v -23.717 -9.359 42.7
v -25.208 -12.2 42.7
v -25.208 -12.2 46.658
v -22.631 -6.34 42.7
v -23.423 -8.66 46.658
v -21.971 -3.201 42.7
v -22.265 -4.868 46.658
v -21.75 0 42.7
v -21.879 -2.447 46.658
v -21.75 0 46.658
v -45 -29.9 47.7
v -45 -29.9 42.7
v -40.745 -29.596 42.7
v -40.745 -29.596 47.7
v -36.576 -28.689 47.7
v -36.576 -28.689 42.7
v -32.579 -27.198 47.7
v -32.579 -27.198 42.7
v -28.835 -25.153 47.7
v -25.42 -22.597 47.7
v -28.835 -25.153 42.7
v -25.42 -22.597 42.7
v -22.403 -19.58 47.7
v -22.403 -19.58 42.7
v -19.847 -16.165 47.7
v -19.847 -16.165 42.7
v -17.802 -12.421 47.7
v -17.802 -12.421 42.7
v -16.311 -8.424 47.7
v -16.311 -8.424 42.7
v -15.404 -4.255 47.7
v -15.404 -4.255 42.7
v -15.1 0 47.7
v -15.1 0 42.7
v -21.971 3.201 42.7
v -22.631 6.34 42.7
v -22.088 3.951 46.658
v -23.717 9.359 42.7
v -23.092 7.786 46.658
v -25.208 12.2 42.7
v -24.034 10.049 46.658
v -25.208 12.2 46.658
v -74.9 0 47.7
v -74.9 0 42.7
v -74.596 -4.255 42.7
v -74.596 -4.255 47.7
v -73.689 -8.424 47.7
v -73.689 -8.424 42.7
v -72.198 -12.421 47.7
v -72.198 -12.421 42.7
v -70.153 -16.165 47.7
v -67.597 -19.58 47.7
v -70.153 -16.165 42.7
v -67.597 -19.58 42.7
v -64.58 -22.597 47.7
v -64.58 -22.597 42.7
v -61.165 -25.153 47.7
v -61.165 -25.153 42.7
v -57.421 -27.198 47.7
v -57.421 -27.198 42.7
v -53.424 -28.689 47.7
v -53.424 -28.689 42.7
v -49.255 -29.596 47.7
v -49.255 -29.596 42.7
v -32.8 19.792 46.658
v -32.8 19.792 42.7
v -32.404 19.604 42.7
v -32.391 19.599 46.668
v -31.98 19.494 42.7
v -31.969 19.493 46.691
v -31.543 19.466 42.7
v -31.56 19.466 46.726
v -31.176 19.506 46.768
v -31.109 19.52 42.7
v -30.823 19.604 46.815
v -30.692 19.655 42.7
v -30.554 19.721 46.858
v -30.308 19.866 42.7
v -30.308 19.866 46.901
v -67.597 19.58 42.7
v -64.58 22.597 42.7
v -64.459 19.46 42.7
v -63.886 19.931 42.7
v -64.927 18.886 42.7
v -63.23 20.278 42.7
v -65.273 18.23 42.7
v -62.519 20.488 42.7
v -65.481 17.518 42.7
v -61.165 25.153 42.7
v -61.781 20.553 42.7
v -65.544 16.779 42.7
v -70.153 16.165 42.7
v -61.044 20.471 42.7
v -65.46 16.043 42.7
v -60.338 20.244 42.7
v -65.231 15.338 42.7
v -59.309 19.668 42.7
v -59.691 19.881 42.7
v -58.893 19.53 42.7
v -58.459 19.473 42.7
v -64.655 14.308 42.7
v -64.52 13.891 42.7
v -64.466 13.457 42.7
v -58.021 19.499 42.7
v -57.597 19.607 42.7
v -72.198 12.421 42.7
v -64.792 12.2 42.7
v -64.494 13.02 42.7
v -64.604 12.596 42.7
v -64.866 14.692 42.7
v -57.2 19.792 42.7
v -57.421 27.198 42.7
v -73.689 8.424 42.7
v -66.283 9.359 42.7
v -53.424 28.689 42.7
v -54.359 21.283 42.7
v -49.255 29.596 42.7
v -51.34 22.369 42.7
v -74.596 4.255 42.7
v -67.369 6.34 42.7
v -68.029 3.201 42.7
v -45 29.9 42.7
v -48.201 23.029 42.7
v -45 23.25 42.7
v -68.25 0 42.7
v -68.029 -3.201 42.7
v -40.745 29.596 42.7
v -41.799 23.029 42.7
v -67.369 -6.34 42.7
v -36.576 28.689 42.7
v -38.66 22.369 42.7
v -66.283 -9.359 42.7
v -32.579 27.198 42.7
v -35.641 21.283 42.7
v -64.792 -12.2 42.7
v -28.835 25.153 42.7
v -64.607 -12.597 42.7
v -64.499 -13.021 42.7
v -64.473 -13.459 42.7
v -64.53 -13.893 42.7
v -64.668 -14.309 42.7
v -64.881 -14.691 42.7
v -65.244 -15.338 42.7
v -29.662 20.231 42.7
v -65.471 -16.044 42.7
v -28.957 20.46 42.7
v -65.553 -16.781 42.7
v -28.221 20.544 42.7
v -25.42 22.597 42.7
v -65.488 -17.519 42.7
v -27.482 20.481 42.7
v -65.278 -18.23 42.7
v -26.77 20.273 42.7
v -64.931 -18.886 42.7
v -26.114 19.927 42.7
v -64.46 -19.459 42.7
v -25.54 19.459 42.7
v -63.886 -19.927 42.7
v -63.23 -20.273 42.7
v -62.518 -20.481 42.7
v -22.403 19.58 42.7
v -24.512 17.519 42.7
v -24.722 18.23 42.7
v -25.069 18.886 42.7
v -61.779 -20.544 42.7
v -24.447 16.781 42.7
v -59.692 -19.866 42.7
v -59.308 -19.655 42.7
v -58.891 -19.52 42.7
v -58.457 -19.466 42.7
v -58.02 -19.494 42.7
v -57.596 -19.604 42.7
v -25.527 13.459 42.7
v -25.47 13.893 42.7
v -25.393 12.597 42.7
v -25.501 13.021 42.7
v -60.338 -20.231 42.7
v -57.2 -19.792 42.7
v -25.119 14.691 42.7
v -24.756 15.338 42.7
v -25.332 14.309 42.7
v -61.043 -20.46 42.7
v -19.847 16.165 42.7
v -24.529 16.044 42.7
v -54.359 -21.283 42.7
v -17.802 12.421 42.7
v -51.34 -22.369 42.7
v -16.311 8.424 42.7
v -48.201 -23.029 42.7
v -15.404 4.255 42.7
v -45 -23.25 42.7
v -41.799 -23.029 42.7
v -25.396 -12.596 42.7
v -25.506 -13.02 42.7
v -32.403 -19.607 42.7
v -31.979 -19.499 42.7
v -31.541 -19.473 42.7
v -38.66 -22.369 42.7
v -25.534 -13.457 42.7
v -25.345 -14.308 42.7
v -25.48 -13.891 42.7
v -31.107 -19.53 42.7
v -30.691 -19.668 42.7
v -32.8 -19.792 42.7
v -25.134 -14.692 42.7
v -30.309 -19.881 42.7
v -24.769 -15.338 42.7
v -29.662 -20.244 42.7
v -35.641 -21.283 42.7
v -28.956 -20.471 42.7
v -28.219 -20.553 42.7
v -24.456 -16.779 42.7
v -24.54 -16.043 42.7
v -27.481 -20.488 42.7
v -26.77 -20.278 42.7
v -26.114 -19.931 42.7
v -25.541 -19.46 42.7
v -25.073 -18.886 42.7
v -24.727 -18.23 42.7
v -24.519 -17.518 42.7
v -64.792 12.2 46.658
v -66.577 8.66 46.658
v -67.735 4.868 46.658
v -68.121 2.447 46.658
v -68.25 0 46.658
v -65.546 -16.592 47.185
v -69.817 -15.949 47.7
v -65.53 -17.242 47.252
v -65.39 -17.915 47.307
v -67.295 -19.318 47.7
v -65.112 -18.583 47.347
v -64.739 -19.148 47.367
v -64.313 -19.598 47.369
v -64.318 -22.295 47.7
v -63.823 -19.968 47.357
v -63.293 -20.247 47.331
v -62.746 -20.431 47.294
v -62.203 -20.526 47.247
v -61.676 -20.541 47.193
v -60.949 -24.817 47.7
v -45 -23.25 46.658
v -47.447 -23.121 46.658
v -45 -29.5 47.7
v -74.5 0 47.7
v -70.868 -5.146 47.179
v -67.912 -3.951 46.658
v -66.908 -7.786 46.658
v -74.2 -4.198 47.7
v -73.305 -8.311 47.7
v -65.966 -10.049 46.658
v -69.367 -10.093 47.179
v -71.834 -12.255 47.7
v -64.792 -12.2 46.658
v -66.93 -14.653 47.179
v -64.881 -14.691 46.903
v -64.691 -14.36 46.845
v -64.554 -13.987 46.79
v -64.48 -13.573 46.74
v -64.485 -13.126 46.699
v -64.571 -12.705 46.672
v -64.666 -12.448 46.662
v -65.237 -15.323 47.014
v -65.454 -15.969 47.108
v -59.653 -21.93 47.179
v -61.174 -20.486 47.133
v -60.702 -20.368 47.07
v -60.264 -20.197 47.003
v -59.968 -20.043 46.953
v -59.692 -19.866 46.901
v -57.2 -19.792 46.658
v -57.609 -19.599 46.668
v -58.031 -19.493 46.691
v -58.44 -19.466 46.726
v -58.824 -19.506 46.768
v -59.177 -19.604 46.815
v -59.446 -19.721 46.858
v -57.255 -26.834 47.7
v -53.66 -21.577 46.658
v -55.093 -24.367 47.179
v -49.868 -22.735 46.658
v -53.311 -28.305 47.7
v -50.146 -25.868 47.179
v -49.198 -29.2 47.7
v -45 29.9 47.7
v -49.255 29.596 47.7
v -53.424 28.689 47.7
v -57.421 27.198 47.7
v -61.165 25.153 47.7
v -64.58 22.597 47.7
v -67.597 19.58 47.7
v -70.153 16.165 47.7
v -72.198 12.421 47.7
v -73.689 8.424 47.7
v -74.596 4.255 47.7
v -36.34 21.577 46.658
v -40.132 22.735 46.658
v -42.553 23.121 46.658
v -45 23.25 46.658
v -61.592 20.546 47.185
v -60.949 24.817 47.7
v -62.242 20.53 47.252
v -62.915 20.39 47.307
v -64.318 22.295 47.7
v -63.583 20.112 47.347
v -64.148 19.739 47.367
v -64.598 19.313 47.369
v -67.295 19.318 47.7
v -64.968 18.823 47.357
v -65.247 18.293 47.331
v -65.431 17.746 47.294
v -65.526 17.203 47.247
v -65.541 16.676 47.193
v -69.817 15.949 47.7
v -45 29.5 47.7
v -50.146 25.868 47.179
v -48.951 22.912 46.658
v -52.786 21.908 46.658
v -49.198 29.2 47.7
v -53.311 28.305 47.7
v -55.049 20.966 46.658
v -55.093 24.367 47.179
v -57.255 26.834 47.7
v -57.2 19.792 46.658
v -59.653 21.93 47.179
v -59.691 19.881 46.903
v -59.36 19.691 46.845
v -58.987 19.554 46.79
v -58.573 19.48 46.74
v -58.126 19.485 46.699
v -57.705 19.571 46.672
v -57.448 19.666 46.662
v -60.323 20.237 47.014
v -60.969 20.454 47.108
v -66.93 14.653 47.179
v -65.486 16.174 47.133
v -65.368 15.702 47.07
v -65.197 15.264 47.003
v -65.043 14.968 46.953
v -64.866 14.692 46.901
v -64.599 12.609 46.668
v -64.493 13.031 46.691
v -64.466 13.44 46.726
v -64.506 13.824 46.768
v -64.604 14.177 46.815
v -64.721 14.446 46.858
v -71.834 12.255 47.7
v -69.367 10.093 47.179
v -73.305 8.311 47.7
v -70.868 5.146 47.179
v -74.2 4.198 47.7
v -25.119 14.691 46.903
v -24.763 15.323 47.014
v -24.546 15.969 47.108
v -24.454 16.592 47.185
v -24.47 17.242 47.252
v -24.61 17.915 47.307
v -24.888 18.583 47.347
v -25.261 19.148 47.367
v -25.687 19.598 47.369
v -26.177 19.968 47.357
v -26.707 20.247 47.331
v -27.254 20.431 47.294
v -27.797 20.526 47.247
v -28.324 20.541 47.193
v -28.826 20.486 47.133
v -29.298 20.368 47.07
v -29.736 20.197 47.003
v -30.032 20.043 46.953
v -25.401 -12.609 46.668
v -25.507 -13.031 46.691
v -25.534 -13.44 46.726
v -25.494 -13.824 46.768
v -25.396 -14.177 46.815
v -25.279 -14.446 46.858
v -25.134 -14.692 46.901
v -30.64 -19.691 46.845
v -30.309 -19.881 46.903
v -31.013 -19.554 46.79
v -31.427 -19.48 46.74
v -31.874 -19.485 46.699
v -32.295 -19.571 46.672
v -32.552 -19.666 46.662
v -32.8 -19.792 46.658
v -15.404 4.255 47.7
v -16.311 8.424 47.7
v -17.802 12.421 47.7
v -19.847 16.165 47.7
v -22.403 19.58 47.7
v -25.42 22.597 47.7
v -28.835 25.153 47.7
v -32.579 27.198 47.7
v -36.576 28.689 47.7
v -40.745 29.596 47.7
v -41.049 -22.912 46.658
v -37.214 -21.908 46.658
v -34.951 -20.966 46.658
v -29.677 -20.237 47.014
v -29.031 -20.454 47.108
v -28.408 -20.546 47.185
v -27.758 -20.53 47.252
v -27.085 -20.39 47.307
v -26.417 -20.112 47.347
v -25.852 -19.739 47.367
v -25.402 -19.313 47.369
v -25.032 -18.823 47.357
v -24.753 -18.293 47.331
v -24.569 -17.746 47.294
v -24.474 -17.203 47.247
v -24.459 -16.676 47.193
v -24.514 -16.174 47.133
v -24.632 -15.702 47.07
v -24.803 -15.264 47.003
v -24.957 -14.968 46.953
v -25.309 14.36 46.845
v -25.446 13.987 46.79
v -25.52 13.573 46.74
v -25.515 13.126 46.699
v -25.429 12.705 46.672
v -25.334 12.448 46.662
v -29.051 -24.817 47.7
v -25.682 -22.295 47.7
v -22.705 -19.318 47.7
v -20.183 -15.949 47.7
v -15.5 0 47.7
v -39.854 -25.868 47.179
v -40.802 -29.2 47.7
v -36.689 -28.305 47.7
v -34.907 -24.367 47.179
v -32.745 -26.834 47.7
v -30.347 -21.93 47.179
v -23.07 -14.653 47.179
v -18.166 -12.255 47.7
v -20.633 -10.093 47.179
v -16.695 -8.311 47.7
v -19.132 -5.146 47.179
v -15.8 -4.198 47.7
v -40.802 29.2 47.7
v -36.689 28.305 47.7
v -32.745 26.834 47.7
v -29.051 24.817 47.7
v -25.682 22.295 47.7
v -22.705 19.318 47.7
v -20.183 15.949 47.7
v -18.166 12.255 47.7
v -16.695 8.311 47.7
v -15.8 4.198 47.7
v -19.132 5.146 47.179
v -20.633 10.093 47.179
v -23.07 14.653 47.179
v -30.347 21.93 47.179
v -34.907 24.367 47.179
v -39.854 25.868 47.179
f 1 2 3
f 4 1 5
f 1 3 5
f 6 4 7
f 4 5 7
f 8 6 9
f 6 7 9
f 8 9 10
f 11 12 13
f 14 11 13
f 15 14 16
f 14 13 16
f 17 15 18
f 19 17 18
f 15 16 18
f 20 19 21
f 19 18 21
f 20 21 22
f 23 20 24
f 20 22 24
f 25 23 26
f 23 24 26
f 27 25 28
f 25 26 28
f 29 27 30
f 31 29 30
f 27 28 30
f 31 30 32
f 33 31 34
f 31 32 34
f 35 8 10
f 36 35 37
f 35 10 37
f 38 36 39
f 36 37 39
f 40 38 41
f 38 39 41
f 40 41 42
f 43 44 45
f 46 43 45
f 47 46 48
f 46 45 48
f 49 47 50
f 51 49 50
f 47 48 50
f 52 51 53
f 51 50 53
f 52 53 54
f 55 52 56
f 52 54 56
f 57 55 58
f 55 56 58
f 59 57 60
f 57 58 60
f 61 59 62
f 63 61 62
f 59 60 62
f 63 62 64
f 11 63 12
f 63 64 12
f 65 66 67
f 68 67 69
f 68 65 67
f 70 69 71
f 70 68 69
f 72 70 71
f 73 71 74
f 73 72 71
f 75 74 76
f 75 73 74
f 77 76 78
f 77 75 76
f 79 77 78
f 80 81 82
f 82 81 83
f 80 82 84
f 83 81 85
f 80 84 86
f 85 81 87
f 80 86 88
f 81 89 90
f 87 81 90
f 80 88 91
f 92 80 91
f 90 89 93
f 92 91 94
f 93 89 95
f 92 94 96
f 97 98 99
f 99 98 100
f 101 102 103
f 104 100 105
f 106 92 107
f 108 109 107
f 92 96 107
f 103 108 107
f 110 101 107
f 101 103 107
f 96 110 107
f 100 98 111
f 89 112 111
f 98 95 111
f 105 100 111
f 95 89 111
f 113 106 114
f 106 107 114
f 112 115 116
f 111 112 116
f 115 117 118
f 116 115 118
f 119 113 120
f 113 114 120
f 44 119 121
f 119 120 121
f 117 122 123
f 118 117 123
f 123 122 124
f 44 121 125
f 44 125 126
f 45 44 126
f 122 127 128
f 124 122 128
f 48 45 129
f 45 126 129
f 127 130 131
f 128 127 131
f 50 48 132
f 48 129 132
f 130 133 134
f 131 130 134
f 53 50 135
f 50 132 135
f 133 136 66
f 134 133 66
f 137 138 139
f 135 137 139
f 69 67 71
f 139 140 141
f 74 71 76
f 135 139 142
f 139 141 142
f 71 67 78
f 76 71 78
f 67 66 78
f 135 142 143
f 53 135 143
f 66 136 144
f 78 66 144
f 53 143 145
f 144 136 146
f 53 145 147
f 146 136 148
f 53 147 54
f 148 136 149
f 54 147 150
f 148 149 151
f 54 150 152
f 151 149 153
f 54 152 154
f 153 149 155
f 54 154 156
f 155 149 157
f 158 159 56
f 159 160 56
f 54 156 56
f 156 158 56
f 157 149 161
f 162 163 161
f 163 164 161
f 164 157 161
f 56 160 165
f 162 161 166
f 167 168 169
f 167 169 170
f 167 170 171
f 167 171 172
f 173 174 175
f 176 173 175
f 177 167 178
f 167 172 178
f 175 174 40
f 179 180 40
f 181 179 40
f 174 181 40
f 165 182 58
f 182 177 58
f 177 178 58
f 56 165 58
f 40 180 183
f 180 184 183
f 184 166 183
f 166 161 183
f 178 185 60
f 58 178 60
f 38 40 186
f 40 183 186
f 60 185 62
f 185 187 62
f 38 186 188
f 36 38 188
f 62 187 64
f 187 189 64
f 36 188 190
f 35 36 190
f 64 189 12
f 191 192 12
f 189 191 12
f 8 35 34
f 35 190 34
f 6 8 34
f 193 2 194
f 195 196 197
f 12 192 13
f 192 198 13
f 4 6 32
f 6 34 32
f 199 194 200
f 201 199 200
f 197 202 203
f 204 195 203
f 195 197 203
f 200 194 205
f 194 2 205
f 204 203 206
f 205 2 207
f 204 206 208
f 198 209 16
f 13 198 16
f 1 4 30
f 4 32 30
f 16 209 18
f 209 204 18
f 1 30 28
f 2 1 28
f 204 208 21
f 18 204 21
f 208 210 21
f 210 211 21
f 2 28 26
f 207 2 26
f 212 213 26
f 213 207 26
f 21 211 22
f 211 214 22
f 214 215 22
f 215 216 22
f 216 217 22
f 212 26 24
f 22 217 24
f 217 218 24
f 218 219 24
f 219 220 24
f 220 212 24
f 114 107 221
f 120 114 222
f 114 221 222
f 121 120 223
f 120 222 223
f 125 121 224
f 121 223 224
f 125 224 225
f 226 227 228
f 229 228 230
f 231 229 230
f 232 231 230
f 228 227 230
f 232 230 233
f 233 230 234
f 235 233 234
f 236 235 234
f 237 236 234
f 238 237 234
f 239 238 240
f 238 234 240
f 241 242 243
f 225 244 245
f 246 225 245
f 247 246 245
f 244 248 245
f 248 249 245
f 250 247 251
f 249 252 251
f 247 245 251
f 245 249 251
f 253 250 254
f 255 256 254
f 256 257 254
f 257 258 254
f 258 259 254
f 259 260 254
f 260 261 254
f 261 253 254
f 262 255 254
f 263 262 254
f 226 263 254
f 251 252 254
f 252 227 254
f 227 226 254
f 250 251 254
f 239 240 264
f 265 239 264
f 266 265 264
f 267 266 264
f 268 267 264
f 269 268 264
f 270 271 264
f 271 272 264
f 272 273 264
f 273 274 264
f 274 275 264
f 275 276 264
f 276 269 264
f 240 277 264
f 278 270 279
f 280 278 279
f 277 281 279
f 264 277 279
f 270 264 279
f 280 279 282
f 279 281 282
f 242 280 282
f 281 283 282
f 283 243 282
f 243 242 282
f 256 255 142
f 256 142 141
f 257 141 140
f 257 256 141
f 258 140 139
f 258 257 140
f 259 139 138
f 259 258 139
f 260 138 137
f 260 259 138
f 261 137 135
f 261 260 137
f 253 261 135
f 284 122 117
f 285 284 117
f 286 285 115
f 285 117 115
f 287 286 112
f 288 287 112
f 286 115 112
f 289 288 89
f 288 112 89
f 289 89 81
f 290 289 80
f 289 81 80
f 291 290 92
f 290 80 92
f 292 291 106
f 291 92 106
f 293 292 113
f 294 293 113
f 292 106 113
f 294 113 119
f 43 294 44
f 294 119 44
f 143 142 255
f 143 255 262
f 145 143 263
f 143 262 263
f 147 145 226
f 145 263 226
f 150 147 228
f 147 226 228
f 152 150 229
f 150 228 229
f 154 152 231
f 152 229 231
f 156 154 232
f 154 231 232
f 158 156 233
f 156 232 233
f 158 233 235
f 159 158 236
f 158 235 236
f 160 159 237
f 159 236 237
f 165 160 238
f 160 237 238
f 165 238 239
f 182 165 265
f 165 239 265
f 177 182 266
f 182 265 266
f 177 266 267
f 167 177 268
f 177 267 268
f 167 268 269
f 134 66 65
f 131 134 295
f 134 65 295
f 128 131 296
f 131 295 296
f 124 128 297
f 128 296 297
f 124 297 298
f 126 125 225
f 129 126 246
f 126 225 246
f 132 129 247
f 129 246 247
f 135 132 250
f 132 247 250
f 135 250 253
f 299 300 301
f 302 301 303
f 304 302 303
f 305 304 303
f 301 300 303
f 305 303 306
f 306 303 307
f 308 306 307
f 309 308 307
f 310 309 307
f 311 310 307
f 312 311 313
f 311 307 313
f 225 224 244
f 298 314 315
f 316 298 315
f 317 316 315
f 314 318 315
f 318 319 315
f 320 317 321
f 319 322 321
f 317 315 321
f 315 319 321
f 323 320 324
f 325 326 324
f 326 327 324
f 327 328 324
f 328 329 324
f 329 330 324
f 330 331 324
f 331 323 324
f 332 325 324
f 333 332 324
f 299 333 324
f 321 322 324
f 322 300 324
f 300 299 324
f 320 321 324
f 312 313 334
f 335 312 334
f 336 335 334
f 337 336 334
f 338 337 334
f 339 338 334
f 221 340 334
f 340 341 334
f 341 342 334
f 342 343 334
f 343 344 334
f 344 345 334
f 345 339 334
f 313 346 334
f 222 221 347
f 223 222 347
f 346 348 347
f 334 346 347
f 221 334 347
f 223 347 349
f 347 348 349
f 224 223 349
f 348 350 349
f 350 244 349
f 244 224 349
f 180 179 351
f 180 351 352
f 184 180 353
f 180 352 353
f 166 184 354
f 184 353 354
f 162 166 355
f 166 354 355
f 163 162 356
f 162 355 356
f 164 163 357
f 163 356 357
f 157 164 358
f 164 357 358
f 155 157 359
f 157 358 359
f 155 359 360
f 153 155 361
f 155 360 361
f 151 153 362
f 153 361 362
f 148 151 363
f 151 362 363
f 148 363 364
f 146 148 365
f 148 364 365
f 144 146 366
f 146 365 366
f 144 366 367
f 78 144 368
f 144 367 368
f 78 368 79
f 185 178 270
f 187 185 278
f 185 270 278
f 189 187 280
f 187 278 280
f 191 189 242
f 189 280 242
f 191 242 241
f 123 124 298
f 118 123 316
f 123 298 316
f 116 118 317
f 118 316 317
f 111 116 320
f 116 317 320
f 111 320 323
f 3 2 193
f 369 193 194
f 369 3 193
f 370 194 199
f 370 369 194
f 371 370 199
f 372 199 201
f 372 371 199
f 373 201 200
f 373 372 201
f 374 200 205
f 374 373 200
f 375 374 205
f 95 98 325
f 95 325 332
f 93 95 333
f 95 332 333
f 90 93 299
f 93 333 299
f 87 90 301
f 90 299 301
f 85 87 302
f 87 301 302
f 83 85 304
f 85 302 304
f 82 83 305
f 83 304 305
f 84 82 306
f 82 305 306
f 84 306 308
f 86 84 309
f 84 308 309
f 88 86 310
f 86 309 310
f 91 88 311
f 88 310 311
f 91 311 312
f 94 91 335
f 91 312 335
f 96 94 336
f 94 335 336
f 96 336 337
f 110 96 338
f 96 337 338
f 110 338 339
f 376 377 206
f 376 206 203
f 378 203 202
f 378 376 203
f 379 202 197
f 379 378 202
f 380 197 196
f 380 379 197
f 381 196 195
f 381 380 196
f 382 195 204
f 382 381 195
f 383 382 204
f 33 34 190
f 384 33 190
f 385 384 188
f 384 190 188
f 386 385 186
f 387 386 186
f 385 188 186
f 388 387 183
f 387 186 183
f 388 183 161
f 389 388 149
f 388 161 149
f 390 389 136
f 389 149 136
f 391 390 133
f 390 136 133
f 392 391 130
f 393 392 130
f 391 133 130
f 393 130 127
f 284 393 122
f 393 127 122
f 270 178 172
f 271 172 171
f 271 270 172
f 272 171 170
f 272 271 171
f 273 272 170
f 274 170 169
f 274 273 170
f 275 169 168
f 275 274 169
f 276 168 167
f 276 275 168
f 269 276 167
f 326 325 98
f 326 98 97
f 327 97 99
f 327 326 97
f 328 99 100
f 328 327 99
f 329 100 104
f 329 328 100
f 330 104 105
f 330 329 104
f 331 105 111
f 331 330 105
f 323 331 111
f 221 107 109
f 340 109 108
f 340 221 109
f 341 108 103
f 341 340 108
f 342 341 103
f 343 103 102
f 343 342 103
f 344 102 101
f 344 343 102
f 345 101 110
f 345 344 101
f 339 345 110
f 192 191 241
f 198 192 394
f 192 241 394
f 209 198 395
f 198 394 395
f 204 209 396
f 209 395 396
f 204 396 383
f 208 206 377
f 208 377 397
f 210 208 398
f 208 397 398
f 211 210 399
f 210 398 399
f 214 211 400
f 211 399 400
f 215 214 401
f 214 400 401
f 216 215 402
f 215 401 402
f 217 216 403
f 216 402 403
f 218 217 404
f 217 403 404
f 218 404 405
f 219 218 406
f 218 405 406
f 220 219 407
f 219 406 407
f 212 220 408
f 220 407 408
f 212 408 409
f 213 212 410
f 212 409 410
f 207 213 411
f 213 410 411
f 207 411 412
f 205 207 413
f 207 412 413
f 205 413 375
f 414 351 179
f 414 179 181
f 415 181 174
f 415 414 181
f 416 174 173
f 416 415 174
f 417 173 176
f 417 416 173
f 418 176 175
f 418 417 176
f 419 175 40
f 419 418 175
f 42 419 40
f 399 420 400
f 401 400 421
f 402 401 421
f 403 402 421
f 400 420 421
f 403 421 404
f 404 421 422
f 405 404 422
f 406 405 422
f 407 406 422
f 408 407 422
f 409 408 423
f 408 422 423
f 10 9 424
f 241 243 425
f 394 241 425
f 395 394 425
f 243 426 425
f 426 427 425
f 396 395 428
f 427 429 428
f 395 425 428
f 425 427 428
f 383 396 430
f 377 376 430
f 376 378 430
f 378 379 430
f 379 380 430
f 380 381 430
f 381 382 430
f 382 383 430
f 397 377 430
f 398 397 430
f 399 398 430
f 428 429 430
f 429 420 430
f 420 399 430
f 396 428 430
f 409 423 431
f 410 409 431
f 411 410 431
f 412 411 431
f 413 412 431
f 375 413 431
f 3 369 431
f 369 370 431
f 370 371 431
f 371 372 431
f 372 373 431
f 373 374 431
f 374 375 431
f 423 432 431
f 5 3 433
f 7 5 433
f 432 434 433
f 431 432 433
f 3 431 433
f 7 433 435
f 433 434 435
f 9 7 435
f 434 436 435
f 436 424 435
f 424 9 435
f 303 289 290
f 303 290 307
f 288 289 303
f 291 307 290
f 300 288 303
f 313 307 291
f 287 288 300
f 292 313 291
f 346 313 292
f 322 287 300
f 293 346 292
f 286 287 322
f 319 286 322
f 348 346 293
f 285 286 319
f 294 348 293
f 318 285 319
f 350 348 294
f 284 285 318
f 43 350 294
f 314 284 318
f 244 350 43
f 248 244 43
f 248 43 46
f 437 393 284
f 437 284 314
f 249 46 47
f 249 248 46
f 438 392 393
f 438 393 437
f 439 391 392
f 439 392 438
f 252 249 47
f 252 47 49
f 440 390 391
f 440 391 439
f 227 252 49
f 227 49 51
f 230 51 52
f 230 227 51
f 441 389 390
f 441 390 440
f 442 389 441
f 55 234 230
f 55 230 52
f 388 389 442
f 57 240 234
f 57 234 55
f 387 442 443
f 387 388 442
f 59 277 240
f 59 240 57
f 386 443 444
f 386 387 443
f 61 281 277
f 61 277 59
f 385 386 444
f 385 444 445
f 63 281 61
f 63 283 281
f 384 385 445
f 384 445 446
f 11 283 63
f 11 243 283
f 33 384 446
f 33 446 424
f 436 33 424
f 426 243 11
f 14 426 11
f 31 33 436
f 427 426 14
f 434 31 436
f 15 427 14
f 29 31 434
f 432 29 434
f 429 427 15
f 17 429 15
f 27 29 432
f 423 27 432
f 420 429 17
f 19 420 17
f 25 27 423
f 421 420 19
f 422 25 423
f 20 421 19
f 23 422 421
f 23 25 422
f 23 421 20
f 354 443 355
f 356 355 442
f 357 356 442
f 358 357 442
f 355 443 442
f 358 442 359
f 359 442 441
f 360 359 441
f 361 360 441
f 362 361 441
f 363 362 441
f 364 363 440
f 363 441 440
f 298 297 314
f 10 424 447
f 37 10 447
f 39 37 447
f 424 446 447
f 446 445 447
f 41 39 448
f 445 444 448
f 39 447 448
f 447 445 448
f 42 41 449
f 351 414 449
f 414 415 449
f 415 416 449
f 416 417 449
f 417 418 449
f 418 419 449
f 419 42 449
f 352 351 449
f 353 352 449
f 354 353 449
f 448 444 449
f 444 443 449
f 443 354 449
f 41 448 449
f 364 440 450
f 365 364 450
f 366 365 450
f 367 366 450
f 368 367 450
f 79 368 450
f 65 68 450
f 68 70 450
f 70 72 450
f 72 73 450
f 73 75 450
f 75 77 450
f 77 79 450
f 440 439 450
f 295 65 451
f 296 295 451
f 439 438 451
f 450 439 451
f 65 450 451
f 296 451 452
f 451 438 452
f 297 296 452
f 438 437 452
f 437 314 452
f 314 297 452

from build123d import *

# Parameters (mm, degrees)
PAD013_DEPTH       = 5
CHAMFER004_SIZE2   = 9
CHAMFER004_SIZE    = 1.5
POCKET005_DEPTH    = 5
SKETCH029_R        = 1.6
POCKET006_DEPTH    = 5
POLARPATTERN_COUNT = 4


with BuildPart() as part:
    # Sketch027 → Pad013 (new body)
    with BuildSketch(Plane.XY):
        with BuildLine():
            ThreePointArc((0, 29.9), (-21.142493, 21.142493), (-29.9, 0))
            Line((-29.9, 0), (-20.5, 0))
            ThreePointArc((0, 20.5), (-14.495689, 14.495689), (-20.5, 0))
            Line((0, 29.9), (0, 20.5))
        make_face()
    extrude(amount=PAD013_DEPTH)

    # Chamfer004
    chamfer004_edges = [part.edges().sort_by_distance(p)[0] for p in [
        (-14.495689, 14.495689, 5),
    ]]
    chamfer004_side = part.faces().sort_by_distance((-14.495689, 14.495689, 2.5))[0]
    chamfer(chamfer004_edges, length=CHAMFER004_SIZE, length2=CHAMFER004_SIZE2, reference=chamfer004_side)

    # Sketch015 (on Face6 of Pad013) → Pocket005 (cut)
    with BuildSketch(Plane.XY.offset(5)):
        with BuildLine():
            ThreePointArc((0, 20.5), (-14.495689, 14.495689), (-20.5, 0))
            Line((-20.5, 0), (-23.25, 0))
            ThreePointArc((-19.791981, 12.2), (-22.368796, 6.340306), (-23.25, 0))
            ThreePointArc((-19.791981, 12.2), (-19.466026, 13.456827), (-19.866411, 14.691959))
            ThreePointArc((-14.691475, 19.881138), (-19.458765, 19.460387), (-19.866411, 14.691959))
            ThreePointArc((-14.691475, 19.881138), (-13.458731, 19.47346), (-12.2, 19.791981))
            ThreePointArc((0, 23.25), (-6.340306, 22.368796), (-12.2, 19.791981))
            Line((0, 20.5), (0, 23.25))
        make_face()
    extrude(amount=-POCKET005_DEPTH, mode=Mode.SUBTRACT)

    # Sketch029 (on Face3 of Pocket005) → Pocket006 (cut)
    with BuildSketch(Plane(origin=(-16.776703, 16.775598, 4.528711), x_dir=(-0.705669, 0.705678, 0.063645), z_dir=(0.045003, -0.045005, 0.997973))):
        with Locations((-16.95, 16.95)):
            Circle(SKETCH029_R)
    extrude(amount=-POCKET006_DEPTH, mode=Mode.SUBTRACT)

    # PolarPattern: part ×4 about axis
    polarpattern_axis = Axis((0, 0, 0), (0, 0, 1))


with BuildPart() as part_1:
    add(part.part)
    for i in range(1, POLARPATTERN_COUNT):
        add(part.part.rotate(polarpattern_axis, i * 360 / POLARPATTERN_COUNT))


with BuildPart() as part_2:
    # Body003 placement: moved
    add(part_1.part.moved(Location((-45, 0, 42.7))))


solid = part_2.part
